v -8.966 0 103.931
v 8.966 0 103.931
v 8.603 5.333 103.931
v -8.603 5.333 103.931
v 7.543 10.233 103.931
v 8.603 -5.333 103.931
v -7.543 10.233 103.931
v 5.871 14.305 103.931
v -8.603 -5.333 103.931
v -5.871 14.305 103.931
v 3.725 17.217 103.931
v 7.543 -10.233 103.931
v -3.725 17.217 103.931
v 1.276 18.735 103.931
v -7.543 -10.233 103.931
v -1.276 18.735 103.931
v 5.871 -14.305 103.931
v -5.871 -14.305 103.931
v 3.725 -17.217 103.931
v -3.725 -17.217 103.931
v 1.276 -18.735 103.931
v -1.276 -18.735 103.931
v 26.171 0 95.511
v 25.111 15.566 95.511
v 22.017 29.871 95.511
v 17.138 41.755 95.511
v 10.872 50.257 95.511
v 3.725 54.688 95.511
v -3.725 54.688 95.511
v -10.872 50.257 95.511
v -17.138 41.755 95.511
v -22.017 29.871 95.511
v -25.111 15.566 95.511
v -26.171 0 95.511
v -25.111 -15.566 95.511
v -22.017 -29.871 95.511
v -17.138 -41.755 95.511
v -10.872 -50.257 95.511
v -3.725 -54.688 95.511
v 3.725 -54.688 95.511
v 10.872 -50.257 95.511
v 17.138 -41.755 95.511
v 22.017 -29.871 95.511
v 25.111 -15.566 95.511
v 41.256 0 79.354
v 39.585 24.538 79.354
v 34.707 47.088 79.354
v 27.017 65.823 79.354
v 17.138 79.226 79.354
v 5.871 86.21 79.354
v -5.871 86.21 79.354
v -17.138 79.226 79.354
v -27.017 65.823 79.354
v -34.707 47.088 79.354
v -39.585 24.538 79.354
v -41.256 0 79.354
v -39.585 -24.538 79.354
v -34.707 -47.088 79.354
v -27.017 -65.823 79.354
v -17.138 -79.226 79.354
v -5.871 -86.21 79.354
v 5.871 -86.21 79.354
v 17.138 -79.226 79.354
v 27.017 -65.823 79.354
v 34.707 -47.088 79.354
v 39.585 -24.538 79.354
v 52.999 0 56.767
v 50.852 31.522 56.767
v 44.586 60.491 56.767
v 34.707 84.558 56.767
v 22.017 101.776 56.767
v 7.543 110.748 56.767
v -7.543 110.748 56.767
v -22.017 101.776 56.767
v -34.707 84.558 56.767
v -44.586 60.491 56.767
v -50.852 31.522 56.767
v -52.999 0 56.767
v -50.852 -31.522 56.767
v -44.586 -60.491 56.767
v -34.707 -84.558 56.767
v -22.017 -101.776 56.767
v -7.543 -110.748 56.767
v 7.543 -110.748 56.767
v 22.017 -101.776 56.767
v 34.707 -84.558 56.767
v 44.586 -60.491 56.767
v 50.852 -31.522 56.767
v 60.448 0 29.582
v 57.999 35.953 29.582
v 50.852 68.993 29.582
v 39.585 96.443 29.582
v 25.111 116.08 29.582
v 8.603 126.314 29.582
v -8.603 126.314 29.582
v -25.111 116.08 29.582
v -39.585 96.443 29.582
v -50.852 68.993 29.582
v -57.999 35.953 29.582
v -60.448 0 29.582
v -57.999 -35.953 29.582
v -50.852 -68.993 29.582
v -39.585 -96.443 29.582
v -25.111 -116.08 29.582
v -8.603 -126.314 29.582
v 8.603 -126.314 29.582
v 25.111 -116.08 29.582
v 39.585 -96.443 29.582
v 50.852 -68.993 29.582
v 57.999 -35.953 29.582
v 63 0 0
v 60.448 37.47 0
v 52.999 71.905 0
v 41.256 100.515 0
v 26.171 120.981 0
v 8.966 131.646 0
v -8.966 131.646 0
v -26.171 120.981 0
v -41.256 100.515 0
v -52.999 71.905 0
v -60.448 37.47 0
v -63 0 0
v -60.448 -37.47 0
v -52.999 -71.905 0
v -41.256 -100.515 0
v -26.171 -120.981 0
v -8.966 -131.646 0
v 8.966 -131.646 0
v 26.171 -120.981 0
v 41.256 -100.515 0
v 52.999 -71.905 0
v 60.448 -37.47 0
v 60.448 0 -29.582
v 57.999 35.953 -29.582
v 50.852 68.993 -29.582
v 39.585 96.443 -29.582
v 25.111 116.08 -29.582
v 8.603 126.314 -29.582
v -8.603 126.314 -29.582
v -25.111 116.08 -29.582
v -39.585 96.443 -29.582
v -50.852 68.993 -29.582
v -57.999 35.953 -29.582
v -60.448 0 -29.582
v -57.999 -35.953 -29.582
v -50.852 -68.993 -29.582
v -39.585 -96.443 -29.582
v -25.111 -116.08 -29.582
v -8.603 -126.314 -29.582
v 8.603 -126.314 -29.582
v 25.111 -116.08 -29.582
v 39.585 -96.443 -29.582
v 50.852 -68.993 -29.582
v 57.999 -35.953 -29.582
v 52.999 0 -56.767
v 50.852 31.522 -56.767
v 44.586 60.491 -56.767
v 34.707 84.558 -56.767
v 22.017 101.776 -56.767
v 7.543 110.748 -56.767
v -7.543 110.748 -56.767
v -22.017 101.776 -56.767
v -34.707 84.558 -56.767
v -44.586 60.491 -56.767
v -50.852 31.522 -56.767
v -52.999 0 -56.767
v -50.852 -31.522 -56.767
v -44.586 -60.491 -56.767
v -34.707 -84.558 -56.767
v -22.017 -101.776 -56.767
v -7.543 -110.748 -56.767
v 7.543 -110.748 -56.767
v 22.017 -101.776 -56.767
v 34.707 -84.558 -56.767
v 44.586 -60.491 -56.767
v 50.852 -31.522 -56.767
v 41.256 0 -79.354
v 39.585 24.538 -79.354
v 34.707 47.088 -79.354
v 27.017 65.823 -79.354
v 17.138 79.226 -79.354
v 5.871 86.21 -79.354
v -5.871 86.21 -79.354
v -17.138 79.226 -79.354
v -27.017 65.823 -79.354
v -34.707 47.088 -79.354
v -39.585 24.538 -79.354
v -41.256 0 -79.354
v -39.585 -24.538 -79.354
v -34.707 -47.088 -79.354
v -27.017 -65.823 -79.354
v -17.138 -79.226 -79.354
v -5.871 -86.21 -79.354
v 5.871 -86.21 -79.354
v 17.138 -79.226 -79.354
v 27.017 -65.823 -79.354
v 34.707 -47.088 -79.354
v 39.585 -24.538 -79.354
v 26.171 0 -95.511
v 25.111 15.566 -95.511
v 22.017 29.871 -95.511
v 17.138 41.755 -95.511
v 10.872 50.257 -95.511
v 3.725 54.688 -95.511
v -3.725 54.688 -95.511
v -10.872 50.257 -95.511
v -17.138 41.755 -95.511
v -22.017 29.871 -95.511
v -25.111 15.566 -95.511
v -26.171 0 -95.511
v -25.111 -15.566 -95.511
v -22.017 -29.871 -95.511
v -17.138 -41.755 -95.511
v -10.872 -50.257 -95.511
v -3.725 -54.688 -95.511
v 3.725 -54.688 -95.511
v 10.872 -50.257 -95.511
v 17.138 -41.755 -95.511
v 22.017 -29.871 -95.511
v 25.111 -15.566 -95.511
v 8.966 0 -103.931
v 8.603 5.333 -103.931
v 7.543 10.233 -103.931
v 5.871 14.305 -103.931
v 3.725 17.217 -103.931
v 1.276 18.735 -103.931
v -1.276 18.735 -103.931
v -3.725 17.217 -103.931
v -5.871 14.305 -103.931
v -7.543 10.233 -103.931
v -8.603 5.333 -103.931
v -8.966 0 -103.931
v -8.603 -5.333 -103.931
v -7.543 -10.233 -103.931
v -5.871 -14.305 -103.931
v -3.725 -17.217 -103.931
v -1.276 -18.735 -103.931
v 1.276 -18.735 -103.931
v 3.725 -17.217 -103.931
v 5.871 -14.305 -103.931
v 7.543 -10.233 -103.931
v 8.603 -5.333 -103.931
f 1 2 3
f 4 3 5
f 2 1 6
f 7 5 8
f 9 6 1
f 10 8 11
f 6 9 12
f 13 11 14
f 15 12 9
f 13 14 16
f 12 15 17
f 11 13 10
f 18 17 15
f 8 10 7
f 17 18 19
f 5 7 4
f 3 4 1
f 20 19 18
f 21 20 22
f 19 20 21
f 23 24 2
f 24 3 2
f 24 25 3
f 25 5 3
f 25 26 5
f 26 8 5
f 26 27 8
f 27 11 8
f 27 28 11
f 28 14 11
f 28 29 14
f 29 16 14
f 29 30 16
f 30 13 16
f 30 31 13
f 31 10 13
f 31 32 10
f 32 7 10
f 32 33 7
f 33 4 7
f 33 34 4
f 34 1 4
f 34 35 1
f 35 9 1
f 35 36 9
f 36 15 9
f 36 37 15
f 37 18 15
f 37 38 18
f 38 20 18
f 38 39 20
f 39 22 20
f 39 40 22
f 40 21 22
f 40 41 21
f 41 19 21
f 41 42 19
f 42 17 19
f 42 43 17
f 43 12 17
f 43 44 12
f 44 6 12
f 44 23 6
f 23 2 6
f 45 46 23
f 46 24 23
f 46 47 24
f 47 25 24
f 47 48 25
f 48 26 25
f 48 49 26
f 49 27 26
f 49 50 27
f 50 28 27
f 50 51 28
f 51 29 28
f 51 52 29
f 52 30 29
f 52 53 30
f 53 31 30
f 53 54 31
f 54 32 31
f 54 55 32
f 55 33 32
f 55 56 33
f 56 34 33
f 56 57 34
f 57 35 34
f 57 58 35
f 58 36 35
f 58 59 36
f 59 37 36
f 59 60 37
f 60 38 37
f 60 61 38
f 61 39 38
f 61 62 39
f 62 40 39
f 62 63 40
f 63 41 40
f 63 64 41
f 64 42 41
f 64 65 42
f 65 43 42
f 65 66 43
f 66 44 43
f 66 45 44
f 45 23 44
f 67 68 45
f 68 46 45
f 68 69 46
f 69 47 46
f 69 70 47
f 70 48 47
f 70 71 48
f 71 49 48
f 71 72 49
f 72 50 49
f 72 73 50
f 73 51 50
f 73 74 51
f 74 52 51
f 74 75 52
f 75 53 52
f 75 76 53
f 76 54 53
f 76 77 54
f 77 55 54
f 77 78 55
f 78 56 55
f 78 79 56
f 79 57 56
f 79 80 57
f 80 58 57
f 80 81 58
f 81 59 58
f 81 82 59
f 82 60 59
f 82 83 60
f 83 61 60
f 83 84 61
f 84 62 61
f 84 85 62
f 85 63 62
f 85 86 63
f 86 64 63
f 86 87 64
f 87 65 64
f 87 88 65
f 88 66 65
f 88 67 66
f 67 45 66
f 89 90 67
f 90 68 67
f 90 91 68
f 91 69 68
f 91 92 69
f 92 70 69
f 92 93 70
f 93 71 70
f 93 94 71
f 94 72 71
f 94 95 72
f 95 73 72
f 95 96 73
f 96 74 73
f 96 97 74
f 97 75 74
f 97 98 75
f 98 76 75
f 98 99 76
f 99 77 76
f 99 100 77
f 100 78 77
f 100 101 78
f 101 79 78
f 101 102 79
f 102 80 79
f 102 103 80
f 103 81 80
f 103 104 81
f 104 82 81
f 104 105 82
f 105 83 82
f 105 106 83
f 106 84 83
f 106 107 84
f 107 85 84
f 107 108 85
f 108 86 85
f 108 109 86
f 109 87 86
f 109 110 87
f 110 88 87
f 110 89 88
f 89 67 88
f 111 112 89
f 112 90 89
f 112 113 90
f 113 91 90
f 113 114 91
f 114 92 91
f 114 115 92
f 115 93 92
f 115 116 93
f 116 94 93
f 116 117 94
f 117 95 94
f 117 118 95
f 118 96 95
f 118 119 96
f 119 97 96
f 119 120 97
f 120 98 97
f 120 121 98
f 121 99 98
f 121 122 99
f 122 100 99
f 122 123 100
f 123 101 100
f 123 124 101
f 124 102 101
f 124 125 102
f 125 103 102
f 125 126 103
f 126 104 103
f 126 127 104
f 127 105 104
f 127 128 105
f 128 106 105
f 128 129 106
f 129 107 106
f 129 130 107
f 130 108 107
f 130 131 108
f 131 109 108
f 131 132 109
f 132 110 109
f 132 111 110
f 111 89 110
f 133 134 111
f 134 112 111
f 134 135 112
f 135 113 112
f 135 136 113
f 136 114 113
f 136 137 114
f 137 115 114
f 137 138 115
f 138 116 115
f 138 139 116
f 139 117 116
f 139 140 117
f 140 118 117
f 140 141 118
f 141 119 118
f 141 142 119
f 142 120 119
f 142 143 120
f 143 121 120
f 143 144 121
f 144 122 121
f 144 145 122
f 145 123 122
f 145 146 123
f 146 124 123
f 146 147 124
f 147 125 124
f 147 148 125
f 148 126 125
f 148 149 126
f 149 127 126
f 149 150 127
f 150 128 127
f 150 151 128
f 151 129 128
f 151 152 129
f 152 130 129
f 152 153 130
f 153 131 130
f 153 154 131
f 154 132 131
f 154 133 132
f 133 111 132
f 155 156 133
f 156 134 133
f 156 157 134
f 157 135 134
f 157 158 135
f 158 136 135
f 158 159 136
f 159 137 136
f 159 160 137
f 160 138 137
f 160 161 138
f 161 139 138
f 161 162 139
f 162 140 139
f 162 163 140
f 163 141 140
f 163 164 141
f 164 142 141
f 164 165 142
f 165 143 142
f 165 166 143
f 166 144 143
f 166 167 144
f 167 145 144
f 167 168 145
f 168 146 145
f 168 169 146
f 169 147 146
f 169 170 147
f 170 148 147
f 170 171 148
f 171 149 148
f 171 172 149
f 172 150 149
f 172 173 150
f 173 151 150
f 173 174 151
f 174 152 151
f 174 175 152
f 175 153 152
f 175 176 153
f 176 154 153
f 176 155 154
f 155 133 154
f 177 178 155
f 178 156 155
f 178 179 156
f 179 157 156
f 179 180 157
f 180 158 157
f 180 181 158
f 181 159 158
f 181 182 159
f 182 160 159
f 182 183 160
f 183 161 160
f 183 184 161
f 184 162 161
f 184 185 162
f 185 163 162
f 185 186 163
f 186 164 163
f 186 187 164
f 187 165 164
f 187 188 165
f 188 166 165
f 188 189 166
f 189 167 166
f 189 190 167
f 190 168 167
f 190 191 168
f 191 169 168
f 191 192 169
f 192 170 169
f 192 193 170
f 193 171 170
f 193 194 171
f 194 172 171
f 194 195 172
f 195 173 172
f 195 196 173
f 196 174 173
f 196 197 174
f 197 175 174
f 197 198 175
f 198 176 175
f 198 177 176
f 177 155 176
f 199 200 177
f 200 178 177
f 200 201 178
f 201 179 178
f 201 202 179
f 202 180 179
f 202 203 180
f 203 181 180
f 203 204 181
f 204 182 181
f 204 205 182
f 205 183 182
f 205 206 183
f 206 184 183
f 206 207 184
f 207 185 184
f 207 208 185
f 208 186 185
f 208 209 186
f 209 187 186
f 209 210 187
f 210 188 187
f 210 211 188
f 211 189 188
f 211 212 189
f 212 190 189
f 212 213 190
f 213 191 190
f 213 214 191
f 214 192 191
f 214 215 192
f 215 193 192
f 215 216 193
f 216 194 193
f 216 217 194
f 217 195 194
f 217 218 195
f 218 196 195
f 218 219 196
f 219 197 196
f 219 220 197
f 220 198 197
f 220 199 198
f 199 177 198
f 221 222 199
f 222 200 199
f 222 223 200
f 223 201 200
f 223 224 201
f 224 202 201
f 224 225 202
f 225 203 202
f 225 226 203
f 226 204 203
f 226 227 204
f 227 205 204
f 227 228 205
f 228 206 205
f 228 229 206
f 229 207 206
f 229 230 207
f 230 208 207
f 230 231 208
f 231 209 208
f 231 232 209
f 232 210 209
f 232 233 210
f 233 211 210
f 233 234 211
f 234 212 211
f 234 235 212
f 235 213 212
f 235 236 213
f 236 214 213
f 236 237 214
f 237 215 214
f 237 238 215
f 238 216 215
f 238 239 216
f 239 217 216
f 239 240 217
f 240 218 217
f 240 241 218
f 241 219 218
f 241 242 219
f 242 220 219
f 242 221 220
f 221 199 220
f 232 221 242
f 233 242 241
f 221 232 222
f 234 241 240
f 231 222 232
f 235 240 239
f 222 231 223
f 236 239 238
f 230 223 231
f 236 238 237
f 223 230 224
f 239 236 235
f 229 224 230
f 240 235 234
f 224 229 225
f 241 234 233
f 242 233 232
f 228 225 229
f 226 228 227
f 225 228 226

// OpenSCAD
// Generated by SolidPython 1.0.1 on 2020-07-29 00:46:49


scale(v = [9, 19, 15]) {
	sphere(r = 7);
}
/***********************************************
*********      SolidPython code:      **********
************************************************
 
# import packages: SolidPython
from solid import *
from solid.utils import *
from itertools import chain, combinations, permutations


class Resize:

    def __init__(self, scad_file):
        self.scad_file = scad_file
        #self.scad_file = import_scad(scad_file)
        # cone/cylinder param:
        self.r1 = 0
        self.r2 = 0
        self.h = 0
        # rectangular prism param:
        self.w = 0
        self.l = 0
        # ellipse param:
        self.r = 0

    # import OpenScad code (file name corresponds to shape)


    # classify shape + parameters
    def assign(self, param1, param2, param3):
        if self.scad_file == 'cone.scad':
            self.r1 = param1
            self.r2 = param2
            self.h = param3
        elif self.scad_file == 'cylinder.scad':
            self.r1 = param1
            self.r2 = param2
            self.h = param3
        elif self.scad_file == 'rectangularPrism.scad':
            self.h = param1
            self.l = param2
            self.w = param3
        else:
            self.r = param1
            self.h = param2

    # resize parameters
    def iterate(self):
        x = range(3, 20, 2)
        i = 1
        if self.scad_file == 'cone.scad':
            tempList = list(permutations(x, 2))
            for temp in tempList:
                param1 = temp[0]
                param2 = temp[1]
                filepath = 'produced_scad_files/' + 'cone' + str(param1) + '_' + str(param2) + '_' + '.scad'
                scad_render_to_file(cylinder(h=param1, r1=param2, r2=0), filepath)

        elif self.scad_file == 'cylinder.scad':
            tempList = list(permutations(x, 3))
            for temp in tempList:
                param1 = temp[0]
                param2 = temp[1]
                filepath = 'produced_scad_files/' + 'cylinder' + str(param1) + '_' + str(param2) + '_' + '.scad'
                scad_render_to_file(cylinder(h=param1, r1=param2, r2=param2), filepath)

        elif self.scad_file == 'rectangularPrism.scad':
            tempList = list(permutations(x, 3))
            for temp in tempList:
                param1 = temp[0]
                param2 = temp[1]
                param3 = temp[2]
                filepath = 'produced_scad_files/' + 'rectangularPrism' + str(param1) + '_' + str(param2) + '_' + str(
                    param3) + '.scad'
                scad_render_to_file(cube(size=(param1, param2, param3)), filepath)

        elif self.scad_file == 'ellipse.scad':
            tempList = list(permutations(x, 4))
            for temp in tempList:
                param1 = temp[0]
                param2 = temp[1]
                param3 = temp[2]
                param4 = temp[3]
                filepath = 'produced_scad_files/' + 'ellipse' + str(param1) + '_' + str(param2) + '_' + str(param3) + '_' + str(param4) + '.scad'
                scad_render_to_file(scale([param1, param2, param3])(sphere(r=param4)), filepath)

    def render_to_scadfile(self):
        scad_render_to_file(scad, 'example.scad') 
 
************************************************/
